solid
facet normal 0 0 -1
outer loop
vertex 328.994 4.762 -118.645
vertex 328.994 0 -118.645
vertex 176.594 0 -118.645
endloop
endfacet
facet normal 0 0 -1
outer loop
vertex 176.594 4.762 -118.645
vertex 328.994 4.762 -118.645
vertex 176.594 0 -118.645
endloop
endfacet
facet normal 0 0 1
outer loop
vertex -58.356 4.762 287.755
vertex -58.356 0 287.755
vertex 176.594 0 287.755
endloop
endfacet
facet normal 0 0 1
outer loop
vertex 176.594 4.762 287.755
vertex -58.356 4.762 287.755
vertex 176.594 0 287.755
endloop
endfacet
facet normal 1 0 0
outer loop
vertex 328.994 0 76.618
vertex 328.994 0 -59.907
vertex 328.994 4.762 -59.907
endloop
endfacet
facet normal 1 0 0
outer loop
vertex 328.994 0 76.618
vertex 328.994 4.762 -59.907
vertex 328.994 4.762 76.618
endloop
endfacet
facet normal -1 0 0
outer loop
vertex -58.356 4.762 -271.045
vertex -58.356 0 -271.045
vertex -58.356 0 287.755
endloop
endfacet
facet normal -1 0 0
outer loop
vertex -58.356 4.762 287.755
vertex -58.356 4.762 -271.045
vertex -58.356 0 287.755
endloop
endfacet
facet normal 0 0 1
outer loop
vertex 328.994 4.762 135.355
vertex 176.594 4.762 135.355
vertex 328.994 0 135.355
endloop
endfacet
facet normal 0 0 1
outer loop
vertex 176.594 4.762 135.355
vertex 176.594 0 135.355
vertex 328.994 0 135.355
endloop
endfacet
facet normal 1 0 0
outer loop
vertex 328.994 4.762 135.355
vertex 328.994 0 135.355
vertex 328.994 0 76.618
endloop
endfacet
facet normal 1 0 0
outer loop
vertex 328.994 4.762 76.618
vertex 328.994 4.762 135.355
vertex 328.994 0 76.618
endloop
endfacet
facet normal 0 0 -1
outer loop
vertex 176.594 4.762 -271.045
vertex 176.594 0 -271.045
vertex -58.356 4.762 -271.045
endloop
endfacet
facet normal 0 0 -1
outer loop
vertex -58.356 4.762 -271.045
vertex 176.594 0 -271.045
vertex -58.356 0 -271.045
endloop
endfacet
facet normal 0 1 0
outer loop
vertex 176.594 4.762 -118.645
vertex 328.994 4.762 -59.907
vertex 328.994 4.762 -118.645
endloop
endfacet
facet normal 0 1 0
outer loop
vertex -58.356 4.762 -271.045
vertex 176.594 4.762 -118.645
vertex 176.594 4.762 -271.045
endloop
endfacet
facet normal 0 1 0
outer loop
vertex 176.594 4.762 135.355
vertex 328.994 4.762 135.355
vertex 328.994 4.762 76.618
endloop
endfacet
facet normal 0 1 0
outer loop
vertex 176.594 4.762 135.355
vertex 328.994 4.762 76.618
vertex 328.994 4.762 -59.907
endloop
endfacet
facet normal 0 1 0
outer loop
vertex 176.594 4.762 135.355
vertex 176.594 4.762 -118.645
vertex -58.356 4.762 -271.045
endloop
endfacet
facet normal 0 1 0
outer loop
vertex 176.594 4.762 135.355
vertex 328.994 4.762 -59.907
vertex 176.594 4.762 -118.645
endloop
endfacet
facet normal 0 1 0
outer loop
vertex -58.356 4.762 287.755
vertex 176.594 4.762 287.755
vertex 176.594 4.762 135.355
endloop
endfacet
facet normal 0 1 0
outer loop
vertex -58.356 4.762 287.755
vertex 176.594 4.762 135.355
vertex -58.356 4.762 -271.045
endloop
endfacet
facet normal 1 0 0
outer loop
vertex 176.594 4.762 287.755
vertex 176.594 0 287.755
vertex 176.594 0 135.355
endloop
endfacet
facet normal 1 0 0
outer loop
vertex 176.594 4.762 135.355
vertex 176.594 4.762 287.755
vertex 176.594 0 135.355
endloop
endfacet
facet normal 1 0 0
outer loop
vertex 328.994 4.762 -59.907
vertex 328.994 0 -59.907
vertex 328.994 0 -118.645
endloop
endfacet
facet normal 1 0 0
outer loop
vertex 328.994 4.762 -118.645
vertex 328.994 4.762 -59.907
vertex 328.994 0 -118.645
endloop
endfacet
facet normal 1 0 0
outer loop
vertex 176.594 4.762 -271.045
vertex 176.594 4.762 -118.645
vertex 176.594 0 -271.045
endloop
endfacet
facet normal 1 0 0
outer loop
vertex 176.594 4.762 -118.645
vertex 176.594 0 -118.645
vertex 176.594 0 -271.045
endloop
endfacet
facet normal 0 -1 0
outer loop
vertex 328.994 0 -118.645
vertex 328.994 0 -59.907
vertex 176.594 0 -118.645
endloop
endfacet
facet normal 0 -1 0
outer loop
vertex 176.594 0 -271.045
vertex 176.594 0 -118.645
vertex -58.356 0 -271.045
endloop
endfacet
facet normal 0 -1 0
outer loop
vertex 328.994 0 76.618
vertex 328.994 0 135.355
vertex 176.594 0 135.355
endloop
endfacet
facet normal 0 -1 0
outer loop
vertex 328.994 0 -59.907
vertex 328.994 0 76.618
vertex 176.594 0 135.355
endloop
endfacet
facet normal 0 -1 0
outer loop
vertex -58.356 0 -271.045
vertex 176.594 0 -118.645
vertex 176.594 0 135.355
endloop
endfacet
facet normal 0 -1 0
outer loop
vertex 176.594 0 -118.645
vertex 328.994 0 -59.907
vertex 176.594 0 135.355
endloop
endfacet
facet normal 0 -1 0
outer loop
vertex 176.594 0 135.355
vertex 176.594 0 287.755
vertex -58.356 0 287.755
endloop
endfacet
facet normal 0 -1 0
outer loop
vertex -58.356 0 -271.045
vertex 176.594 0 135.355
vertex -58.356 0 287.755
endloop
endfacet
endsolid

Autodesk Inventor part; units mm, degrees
ref_plane "YZ Plane" through (0, 0, 0) normal (1, 0, 0) x (0, 1, 0)
ref_plane "XZ Plane" through (0, 0, 0) normal (0, 1, 0) x (-1, 0, 0)
ref_plane "XY Plane" through (0, 0, 0) normal (0, 0, 1) x (1, 0, 0)
sketch "Sketch1" plane through (0, 0, 0) normal (0, 1, 0) x (-1, 0, 0)
  line L0 (58.3565, 287.7551) -> (-176.5935, 287.7551)
  line L1 (-176.5935, -271.0449) -> (58.3565, -271.0449)
  line L2 (58.3565, -271.0449) -> (58.3565, 287.7551)
  line L3 (-176.5935, 287.7551) -> (-176.5935, 135.3551)
  line L4 (-176.5935, 135.3551) -> (-328.9935, 135.3551)
  line L5 (-328.9935, -118.6449) -> (-176.5935, -118.6449)
  line L6 (-176.5935, -118.6449) -> (-176.5935, -271.0449)
  line L7 (-328.9935, 135.3551) -> (-328.9935, 76.6176)
  line L8 (-328.9935, -59.9074) -> (-328.9935, -118.6449)
  line L9 (-328.9935, -59.9074) -> (-328.9935, 76.6176)
  dimension "d3" = 558.8
  dimension "d4" = 234.95
  dimension "d5" = 152.4
  dimension "d6" = 152.4
  dimension "d11" = 152.4
  dimension "d12" = 234.95
extrude "Plate1" add sketch "Sketch1" along normal blind 4.7625
equation "\"BendRadius\" = Thickness"
equation "\"BendReliefWidth\" = Thickness"
equation "\"BendReliefDepth\" = 0.5 * Thickness"
equation "\"CornerReliefSize\" = 4 * Thickness"
equation "\"MinimumRemnant\" = 2 * Thickness"
equation "\"TransitionRadius\" = BendRadius"
equation "\"JacobiRadiusSize\" = BendRadius"
equation "\"GapSize\" = Thickness"
equation "\"d9\" = BendRadius"
equation "\"Thickness\" = 4.7625"
properties part number "top_bottom_rev2" material "Steel, Mild"
